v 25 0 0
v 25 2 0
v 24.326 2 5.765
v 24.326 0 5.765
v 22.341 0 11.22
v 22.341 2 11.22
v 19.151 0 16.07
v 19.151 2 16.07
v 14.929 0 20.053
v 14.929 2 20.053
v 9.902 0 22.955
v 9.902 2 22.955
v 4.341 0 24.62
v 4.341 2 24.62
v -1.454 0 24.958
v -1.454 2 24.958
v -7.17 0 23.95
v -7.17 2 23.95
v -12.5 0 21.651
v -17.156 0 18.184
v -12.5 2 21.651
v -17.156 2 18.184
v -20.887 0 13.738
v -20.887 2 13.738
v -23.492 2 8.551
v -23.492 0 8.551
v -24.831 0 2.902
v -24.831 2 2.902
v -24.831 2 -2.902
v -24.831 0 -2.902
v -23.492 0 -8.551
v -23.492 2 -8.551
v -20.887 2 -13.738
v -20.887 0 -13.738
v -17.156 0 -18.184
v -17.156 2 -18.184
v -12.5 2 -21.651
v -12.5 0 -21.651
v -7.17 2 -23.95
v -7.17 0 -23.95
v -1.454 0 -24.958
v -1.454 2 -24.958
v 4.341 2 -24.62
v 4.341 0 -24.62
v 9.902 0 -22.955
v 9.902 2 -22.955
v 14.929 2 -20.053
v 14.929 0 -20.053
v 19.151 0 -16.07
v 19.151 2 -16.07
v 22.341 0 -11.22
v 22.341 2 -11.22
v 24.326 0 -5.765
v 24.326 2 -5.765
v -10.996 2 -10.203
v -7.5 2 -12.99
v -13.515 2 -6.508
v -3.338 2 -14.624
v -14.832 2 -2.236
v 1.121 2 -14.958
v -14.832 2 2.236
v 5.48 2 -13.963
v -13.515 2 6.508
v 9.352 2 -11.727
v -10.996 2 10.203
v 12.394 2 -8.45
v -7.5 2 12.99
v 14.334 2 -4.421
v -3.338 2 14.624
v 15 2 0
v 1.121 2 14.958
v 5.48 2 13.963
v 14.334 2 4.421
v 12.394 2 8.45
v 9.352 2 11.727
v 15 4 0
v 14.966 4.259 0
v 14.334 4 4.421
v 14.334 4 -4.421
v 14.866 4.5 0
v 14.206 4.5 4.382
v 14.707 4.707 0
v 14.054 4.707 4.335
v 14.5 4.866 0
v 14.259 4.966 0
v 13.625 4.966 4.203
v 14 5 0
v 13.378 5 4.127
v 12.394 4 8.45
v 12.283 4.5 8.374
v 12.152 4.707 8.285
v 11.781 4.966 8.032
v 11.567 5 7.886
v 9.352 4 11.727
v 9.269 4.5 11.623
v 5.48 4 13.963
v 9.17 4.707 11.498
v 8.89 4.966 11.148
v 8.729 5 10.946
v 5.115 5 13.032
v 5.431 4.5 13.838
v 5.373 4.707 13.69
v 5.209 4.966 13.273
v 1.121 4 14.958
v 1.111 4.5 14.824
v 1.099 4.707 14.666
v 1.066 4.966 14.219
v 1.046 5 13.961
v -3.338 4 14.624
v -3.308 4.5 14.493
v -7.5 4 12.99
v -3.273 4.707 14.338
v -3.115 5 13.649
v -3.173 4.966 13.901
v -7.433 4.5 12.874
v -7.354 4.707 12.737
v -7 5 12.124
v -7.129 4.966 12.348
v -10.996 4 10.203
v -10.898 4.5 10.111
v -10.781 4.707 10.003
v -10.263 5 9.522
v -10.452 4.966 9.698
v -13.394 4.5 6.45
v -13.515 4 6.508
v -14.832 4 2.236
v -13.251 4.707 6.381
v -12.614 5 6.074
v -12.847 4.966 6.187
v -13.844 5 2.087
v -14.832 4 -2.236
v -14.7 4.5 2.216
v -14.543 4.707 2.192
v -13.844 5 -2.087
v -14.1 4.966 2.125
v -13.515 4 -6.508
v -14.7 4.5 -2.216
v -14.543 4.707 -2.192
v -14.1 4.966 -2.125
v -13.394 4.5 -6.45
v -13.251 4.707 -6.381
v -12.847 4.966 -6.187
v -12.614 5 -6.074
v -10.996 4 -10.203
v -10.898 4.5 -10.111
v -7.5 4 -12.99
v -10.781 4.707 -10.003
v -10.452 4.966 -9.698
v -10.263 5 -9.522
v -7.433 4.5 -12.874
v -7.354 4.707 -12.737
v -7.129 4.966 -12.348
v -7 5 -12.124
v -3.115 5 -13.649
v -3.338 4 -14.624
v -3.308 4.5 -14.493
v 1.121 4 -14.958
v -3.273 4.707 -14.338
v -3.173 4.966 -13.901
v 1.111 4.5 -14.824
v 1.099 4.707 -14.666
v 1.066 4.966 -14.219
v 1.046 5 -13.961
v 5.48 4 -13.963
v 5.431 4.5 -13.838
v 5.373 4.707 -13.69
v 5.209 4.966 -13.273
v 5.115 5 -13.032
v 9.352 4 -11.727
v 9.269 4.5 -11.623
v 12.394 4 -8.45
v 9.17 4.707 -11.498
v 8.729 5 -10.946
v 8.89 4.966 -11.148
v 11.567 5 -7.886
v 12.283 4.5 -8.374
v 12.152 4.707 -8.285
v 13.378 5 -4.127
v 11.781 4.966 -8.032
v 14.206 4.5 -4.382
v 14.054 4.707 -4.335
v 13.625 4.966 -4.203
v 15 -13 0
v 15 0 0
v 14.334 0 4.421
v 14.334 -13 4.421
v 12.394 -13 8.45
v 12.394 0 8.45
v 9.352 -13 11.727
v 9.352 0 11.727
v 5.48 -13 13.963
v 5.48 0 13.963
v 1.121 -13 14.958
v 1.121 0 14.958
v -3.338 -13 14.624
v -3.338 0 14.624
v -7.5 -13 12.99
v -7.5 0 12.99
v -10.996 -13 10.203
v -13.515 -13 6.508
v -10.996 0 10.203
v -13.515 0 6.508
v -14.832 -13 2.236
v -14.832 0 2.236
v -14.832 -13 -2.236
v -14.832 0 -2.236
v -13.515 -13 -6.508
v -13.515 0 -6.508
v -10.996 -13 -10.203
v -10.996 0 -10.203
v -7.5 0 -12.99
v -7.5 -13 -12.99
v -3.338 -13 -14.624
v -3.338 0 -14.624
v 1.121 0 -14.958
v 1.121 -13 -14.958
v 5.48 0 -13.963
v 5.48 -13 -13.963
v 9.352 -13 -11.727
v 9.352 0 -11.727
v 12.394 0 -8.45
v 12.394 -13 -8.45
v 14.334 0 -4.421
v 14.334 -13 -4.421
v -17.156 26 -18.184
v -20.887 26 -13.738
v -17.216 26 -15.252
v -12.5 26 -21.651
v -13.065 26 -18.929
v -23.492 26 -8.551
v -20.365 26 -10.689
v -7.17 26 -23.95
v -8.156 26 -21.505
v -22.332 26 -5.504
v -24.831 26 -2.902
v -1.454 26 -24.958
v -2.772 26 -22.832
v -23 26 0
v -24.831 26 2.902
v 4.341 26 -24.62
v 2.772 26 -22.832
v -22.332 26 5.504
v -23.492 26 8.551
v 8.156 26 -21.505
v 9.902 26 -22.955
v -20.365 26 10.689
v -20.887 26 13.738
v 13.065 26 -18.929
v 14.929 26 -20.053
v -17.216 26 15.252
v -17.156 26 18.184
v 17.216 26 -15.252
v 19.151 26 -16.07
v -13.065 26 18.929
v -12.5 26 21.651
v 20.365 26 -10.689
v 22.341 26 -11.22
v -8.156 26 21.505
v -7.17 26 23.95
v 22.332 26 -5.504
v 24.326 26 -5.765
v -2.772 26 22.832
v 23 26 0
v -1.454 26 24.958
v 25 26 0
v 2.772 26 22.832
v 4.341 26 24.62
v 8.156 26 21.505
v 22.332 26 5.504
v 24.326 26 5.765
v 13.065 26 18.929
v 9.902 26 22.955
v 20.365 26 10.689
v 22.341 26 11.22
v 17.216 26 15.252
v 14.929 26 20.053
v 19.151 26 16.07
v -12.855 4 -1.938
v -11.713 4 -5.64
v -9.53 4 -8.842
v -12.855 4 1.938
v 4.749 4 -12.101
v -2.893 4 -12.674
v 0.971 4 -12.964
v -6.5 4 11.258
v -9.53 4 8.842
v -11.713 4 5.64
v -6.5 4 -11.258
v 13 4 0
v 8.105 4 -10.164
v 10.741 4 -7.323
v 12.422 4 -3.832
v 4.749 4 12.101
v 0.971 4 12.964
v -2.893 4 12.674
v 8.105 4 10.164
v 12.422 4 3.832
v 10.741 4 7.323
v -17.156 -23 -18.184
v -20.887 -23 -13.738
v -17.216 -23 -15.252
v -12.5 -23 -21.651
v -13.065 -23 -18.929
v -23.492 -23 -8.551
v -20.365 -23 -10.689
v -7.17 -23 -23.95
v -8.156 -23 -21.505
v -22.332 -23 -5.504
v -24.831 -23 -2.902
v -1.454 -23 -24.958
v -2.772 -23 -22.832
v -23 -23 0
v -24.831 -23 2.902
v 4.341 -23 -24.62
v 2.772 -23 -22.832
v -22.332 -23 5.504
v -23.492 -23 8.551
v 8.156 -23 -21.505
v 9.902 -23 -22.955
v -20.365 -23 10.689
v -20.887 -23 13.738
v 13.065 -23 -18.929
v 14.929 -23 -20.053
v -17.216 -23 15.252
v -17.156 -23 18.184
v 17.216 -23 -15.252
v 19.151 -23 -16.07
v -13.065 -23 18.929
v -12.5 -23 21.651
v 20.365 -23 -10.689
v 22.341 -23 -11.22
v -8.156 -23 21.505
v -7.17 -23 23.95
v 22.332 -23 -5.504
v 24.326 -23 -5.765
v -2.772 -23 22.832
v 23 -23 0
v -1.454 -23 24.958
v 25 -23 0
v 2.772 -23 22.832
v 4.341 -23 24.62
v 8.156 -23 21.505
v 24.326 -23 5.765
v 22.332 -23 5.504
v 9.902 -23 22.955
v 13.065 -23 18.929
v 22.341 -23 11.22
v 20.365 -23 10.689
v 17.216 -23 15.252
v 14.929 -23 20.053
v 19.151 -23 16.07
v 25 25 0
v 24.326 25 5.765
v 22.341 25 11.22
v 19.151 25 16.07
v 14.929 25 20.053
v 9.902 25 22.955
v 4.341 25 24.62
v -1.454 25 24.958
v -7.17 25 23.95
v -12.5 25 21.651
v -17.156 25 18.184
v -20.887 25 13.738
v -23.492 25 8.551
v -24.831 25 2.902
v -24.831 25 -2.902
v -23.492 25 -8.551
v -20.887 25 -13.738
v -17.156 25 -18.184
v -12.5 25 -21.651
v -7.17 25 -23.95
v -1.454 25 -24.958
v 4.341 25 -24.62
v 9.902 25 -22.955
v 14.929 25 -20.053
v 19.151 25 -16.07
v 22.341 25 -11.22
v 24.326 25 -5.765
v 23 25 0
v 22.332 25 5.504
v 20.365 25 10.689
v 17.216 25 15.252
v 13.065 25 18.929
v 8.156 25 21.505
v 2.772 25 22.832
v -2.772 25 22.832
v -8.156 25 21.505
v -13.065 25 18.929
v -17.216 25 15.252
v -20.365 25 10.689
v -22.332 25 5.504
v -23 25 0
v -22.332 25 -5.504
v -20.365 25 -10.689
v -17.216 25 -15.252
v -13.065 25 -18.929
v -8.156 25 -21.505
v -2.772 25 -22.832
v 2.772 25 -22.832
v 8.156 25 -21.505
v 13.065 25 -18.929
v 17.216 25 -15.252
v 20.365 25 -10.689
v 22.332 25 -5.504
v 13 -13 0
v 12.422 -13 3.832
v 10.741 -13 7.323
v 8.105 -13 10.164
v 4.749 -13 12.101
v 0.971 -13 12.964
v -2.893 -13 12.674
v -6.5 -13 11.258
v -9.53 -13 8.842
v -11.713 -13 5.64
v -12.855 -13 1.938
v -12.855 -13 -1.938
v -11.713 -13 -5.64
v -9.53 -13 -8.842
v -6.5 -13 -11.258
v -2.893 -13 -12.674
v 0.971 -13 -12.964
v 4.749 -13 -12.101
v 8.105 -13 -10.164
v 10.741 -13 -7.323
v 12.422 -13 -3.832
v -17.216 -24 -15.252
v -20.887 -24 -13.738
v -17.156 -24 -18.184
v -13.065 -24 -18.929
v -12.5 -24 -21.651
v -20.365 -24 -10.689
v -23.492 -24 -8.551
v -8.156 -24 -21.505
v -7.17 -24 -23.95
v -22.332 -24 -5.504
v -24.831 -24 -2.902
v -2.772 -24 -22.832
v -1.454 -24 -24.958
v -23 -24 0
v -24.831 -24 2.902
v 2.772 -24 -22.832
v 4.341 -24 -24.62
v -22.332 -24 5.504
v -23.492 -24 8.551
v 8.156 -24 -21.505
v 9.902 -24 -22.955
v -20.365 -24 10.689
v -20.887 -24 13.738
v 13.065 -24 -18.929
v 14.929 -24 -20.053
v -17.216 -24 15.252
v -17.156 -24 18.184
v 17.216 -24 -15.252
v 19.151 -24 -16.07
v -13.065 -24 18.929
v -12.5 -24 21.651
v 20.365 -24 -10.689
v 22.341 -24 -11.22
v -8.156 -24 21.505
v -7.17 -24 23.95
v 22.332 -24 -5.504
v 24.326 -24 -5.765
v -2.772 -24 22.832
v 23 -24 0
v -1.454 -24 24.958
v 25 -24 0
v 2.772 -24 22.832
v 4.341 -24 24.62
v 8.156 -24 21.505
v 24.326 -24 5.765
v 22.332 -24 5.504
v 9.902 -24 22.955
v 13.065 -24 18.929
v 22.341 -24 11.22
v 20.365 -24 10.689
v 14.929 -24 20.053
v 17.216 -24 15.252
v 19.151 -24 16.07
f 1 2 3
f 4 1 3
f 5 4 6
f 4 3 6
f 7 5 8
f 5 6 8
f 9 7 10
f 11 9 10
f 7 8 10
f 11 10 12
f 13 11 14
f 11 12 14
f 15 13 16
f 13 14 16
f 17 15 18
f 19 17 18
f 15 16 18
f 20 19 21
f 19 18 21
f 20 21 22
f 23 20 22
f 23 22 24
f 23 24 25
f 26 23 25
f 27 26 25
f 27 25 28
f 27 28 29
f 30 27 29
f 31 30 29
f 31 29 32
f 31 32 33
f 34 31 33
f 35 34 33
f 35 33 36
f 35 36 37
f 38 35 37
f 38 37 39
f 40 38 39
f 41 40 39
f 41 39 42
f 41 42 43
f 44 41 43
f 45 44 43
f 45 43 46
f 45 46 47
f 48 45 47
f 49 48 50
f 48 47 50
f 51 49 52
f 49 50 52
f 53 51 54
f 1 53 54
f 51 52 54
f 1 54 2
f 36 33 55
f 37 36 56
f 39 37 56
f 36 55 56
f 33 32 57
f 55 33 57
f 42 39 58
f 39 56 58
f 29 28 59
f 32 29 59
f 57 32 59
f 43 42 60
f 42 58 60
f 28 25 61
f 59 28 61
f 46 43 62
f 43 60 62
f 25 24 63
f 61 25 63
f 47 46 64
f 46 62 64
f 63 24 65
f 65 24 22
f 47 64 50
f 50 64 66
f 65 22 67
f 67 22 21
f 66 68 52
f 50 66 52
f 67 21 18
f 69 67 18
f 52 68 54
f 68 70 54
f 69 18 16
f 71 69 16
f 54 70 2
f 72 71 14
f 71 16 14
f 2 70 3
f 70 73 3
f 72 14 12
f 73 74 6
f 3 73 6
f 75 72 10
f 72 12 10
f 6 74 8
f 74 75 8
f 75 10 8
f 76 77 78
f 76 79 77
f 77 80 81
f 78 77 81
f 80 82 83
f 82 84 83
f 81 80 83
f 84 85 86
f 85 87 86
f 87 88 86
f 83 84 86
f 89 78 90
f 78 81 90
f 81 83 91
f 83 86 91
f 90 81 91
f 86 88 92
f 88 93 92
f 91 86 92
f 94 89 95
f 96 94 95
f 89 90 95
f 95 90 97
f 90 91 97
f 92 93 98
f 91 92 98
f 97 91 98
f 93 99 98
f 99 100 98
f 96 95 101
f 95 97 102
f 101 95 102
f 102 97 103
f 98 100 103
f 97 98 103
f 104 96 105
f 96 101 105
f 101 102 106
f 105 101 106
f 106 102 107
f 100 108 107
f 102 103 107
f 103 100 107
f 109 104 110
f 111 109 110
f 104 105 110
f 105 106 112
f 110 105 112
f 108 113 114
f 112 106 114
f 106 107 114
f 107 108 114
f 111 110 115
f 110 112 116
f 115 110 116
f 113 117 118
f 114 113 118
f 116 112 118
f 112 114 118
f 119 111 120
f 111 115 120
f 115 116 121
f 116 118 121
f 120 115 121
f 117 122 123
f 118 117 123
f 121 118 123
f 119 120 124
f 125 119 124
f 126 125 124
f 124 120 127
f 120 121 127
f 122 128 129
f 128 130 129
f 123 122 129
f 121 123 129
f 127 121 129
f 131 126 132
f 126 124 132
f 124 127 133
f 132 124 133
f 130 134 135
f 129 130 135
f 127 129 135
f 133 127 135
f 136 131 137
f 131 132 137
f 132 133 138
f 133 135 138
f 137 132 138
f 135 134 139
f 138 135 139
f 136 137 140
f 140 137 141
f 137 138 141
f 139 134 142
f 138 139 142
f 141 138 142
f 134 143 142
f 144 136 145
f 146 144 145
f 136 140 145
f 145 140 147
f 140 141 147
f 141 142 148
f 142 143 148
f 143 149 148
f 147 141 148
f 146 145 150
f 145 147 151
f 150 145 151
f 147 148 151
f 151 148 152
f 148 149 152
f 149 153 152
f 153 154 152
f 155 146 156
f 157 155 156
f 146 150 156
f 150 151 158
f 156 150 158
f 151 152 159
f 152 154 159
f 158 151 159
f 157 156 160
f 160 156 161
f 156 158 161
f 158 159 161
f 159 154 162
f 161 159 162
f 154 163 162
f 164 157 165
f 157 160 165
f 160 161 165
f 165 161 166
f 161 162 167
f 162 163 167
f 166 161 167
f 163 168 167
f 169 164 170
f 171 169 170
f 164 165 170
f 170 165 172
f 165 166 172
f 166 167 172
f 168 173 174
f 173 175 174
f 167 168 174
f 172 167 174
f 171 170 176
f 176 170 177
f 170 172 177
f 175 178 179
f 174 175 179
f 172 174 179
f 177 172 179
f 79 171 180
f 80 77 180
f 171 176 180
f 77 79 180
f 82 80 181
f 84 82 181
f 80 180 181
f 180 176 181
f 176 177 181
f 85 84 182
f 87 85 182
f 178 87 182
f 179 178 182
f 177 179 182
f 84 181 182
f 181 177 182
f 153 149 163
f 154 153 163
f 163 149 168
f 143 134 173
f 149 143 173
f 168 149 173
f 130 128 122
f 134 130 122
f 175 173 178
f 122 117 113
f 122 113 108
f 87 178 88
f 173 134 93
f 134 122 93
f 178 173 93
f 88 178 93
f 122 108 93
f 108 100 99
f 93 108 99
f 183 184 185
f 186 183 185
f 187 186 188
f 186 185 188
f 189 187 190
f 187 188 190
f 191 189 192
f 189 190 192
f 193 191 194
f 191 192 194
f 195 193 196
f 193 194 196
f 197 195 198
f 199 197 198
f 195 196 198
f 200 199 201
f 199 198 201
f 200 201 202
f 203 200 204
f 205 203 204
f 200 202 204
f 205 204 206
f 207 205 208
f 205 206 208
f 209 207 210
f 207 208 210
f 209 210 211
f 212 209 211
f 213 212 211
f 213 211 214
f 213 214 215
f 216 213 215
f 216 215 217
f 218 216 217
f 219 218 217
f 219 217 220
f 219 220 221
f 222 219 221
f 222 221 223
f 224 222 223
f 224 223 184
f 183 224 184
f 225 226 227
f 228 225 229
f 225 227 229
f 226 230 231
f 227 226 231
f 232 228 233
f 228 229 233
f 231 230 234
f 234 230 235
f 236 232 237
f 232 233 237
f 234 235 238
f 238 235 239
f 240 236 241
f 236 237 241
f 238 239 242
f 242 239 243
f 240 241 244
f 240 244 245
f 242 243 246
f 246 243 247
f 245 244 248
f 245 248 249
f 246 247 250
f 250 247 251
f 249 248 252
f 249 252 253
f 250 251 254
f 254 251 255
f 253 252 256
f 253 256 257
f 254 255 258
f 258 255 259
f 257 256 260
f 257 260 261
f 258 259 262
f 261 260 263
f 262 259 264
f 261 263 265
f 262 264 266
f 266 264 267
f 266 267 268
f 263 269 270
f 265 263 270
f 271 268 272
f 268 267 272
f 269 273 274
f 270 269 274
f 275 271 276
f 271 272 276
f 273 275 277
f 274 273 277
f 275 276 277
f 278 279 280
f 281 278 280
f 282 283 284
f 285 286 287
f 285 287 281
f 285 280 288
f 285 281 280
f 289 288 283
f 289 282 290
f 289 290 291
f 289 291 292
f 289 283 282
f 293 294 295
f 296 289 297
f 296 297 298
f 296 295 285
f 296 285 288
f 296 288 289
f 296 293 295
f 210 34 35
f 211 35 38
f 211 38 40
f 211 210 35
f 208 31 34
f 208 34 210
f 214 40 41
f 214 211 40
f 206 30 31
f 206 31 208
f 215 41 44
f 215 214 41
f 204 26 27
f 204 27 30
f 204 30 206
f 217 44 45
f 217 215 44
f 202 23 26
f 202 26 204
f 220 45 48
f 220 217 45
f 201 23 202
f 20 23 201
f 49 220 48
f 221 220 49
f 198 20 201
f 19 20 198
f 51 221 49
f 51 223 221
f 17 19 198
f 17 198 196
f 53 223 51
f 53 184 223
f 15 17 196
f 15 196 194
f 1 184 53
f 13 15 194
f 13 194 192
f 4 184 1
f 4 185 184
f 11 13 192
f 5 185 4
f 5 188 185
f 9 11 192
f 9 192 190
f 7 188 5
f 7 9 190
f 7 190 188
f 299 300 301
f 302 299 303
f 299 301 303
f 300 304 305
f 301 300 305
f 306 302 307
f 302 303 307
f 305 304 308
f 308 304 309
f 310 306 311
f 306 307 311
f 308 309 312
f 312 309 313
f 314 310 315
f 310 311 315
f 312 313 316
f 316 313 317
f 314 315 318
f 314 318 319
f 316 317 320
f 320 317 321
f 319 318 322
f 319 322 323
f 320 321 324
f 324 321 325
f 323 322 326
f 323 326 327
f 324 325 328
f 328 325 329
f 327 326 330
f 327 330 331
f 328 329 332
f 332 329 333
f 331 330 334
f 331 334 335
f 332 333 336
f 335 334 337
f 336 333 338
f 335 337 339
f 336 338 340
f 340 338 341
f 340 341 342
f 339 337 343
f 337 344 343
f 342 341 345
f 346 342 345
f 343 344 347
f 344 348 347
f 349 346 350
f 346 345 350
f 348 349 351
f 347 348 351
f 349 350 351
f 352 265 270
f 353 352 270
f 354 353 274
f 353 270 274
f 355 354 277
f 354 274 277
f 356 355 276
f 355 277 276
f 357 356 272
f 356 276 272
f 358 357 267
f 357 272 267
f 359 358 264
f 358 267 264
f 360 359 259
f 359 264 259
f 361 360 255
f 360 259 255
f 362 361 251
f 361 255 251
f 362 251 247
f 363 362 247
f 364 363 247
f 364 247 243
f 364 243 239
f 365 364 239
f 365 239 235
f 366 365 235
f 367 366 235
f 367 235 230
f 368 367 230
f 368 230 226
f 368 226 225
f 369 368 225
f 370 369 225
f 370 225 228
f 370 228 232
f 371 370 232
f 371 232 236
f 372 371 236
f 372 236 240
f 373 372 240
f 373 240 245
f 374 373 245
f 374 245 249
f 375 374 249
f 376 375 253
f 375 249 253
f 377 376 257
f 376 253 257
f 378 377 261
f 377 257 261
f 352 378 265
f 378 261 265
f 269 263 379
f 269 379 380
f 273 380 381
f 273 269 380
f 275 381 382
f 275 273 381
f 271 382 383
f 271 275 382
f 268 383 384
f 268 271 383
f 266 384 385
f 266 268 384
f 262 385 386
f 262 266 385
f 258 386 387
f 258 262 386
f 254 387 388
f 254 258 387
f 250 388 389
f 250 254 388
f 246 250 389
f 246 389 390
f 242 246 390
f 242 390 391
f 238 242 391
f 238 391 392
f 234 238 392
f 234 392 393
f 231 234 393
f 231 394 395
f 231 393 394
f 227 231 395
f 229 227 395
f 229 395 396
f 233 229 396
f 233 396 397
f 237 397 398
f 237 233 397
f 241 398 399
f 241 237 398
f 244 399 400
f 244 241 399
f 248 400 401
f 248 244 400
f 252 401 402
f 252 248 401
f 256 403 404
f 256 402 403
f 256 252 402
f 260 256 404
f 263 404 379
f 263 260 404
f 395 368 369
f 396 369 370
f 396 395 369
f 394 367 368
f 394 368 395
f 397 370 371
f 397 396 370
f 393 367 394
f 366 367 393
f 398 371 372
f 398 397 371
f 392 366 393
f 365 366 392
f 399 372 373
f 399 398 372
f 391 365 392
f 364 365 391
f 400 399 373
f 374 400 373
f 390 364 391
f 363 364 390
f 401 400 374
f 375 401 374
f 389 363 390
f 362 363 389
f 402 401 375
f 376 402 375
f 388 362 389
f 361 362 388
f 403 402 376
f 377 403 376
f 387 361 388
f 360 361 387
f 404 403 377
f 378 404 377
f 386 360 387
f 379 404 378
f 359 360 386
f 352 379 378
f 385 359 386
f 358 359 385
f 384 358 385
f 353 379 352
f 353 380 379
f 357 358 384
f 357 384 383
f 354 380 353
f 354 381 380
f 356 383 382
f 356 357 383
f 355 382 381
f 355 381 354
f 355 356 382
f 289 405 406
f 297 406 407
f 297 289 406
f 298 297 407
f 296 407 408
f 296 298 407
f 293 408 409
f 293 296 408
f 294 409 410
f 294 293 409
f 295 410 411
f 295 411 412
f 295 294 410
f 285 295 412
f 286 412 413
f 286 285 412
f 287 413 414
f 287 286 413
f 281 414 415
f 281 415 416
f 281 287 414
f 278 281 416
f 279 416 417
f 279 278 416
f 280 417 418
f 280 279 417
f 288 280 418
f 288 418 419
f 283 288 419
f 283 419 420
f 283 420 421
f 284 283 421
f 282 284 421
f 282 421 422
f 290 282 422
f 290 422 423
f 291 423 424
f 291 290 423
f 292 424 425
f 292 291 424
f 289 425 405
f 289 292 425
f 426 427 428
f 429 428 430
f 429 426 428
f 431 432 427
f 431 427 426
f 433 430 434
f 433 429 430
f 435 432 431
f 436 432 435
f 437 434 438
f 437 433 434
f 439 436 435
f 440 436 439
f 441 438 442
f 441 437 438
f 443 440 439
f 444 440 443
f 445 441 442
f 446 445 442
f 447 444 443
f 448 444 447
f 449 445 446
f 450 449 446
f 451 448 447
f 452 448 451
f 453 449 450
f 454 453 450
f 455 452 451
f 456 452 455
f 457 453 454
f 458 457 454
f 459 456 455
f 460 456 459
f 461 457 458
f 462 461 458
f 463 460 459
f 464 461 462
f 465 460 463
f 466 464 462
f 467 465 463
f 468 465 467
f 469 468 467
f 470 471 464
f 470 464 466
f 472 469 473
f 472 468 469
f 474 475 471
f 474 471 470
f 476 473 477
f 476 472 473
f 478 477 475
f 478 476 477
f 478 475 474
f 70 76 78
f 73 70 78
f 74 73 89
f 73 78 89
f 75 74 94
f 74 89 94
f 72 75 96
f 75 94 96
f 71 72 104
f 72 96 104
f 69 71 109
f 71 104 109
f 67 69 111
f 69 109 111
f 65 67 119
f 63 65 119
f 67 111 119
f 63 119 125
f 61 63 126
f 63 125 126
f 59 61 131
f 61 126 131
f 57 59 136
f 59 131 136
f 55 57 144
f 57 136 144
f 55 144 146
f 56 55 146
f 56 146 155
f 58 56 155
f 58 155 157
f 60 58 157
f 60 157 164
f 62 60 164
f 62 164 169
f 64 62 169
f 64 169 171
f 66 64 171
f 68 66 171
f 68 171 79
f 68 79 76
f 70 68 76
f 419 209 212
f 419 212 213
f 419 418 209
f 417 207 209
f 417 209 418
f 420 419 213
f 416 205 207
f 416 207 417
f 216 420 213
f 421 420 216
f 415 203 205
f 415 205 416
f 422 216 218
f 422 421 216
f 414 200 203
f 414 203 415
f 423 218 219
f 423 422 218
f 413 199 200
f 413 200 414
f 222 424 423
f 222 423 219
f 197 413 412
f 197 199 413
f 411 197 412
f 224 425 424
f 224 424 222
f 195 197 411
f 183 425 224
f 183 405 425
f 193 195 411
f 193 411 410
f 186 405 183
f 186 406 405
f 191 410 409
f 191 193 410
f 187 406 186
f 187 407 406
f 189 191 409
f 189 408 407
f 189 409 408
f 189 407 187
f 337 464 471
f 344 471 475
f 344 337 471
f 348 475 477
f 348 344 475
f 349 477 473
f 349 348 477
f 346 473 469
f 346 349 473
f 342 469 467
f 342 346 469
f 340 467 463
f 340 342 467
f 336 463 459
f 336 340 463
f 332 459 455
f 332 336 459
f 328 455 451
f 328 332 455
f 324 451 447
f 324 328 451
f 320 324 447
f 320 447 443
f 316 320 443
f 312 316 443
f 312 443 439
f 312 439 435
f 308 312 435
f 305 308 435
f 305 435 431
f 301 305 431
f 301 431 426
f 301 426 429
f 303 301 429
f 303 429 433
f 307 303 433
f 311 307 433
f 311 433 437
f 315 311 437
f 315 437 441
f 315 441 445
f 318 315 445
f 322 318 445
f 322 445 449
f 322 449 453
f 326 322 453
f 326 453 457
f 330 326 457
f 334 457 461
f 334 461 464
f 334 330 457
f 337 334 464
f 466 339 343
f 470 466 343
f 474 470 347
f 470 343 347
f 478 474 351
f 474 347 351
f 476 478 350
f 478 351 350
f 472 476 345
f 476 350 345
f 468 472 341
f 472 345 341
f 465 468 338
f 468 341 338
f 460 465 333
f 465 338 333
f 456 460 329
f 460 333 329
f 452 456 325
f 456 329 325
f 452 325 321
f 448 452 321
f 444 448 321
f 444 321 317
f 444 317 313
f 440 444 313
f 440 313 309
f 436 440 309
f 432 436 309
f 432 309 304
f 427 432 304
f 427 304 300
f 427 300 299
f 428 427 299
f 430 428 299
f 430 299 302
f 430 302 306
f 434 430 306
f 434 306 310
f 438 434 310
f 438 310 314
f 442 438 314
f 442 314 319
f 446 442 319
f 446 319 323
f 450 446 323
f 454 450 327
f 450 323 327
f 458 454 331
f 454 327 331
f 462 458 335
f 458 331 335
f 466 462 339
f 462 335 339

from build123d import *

# Parameters (mm, degrees)
CYLINDER007_R          = 15
CYLINDER007_DEPTH      = 10
CYLINDER007_ROLL_ANGLE = -90
CYLINDER006_R          = 25
CYLINDER006_DEPTH      = 2
CYLINDER006_ROLL_ANGLE = 90
CYLINDER001_R          = 13
CYLINDER001_DEPTH      = 17
CYLINDER001_ROLL_ANGLE = 90
CYLINDER_R             = 15
CYLINDER_DEPTH         = 18
CYLINDER_ROLL_ANGLE    = 90
FILLET001_R            = 1
CYLINDER005_R          = 25
CYLINDER005_DEPTH      = 23
CYLINDER005_ROLL_ANGLE = 90
CYLINDER004_R          = 25
CYLINDER004_DEPTH      = 23
CYLINDER004_ROLL_ANGLE = 90
CYLINDER003_R          = 23
CYLINDER003_DEPTH      = 50
CYLINDER003_ROLL_ANGLE = 90
CYLINDER002_R          = 25
CYLINDER002_DEPTH      = 50
CYLINDER002_ROLL_ANGLE = 90


with BuildPart() as cylinder007:
    # Cylinder007 → Cylinder007 (new body)
    with BuildSketch(Plane.XY):
        Circle(CYLINDER007_R)
    extrude(amount=CYLINDER007_DEPTH)


with BuildPart() as cylinder007_1:
    # Cylinder007 roll: moved
    add(cylinder007.part.rotate(Axis((0, 0, 0), (1, 0, 0)), CYLINDER007_ROLL_ANGLE))


with BuildPart() as cylinder007_2:
    # Cylinder007 placement: moved
    add(cylinder007_1.part)


with BuildPart() as cut004:
    # Cylinder006 → Cylinder006 (new body)
    with BuildSketch(Plane.XY):
        Circle(CYLINDER006_R)
    extrude(amount=CYLINDER006_DEPTH)


with BuildPart() as cut004_1:
    # Cylinder006 roll: moved
    add(cut004.part.rotate(Axis((0, 0, 0), (1, 0, 0)), CYLINDER006_ROLL_ANGLE))


with BuildPart() as cut004_2:
    # Cylinder006 placement: moved
    add(cut004_1.part.moved(Location((0, 2, 0))))

    # Cut004: cut Cylinder007
    add(cylinder007_2.part, mode=Mode.SUBTRACT)


with BuildPart() as cylinder001:
    # Cylinder001 → Cylinder001 (new body)
    with BuildSketch(Plane.XY):
        Circle(CYLINDER001_R)
    extrude(amount=CYLINDER001_DEPTH)


with BuildPart() as cylinder001_1:
    # Cylinder001 roll: moved
    add(cylinder001.part.rotate(Axis((0, 0, 0), (1, 0, 0)), CYLINDER001_ROLL_ANGLE))


with BuildPart() as cylinder001_2:
    # Cylinder001 placement: moved
    add(cylinder001_1.part.moved(Location((0, 4, 0))))


with BuildPart() as fusion002:
    # Cylinder → Cylinder (new body)
    with BuildSketch(Plane.XY):
        Circle(CYLINDER_R)
    extrude(amount=CYLINDER_DEPTH)


with BuildPart() as fusion002_1:
    # Cylinder roll: moved
    add(fusion002.part.rotate(Axis((0, 0, 0), (1, 0, 0)), CYLINDER_ROLL_ANGLE))


with BuildPart() as fusion002_2:
    # Cylinder placement: moved
    add(fusion002_1.part.moved(Location((0, 5, 0))))

    # Cut: cut Cylinder001
    add(cylinder001_2.part, mode=Mode.SUBTRACT)

    # Fillet001
    fillet001_edges = [fusion002_2.edges().sort_by_distance(p)[0] for p in [
        (-15, 5, 0),
    ]]
    fillet(fillet001_edges, radius=FILLET001_R)

    # Fusion002: union Cut004
    add(cut004_2.part)


with BuildPart() as cylinder005:
    # Cylinder005 → Cylinder005 (new body)
    with BuildSketch(Plane.XY):
        Circle(CYLINDER005_R)
    extrude(amount=CYLINDER005_DEPTH)


with BuildPart() as cylinder005_1:
    # Cylinder005 roll: moved
    add(cylinder005.part.rotate(Axis((0, 0, 0), (1, 0, 0)), CYLINDER005_ROLL_ANGLE))


with BuildPart() as cylinder005_2:
    # Cylinder005 placement: moved
    add(cylinder005_1.part)


with BuildPart() as cylinder004:
    # Cylinder004 → Cylinder004 (new body)
    with BuildSketch(Plane.XY):
        Circle(CYLINDER004_R)
    extrude(amount=CYLINDER004_DEPTH)


with BuildPart() as cylinder004_1:
    # Cylinder004 roll: moved
    add(cylinder004.part.rotate(Axis((0, 0, 0), (1, 0, 0)), CYLINDER004_ROLL_ANGLE))


with BuildPart() as cylinder004_2:
    # Cylinder004 placement: moved
    add(cylinder004_1.part.moved(Location((0, 25, 0))))


with BuildPart() as cylinder003:
    # Cylinder003 → Cylinder003 (new body)
    with BuildSketch(Plane.XY):
        Circle(CYLINDER003_R)
    extrude(amount=CYLINDER003_DEPTH)


with BuildPart() as cylinder003_1:
    # Cylinder003 roll: moved
    add(cylinder003.part.rotate(Axis((0, 0, 0), (1, 0, 0)), CYLINDER003_ROLL_ANGLE))


with BuildPart() as cylinder003_2:
    # Cylinder003 placement: moved
    add(cylinder003_1.part.moved(Location((0, 26, 0))))


with BuildPart() as fusion003:
    # Cylinder002 → Cylinder002 (new body)
    with BuildSketch(Plane.XY):
        Circle(CYLINDER002_R)
    extrude(amount=CYLINDER002_DEPTH)


with BuildPart() as fusion003_1:
    # Cylinder002 roll: moved
    add(fusion003.part.rotate(Axis((0, 0, 0), (1, 0, 0)), CYLINDER002_ROLL_ANGLE))


with BuildPart() as fusion003_2:
    # Cylinder002 placement: moved
    add(fusion003_1.part.moved(Location((0, 26, 0))))

    # Cut001: cut Cylinder003
    add(cylinder003_2.part, mode=Mode.SUBTRACT)

    # Cut002: cut Cylinder004
    add(cylinder004_2.part, mode=Mode.SUBTRACT)

    # Cut003: cut Cylinder005
    add(cylinder005_2.part, mode=Mode.SUBTRACT)

    # Fusion003: union Fusion002
    add(fusion002_2.part)


solid = fusion003_2.part
